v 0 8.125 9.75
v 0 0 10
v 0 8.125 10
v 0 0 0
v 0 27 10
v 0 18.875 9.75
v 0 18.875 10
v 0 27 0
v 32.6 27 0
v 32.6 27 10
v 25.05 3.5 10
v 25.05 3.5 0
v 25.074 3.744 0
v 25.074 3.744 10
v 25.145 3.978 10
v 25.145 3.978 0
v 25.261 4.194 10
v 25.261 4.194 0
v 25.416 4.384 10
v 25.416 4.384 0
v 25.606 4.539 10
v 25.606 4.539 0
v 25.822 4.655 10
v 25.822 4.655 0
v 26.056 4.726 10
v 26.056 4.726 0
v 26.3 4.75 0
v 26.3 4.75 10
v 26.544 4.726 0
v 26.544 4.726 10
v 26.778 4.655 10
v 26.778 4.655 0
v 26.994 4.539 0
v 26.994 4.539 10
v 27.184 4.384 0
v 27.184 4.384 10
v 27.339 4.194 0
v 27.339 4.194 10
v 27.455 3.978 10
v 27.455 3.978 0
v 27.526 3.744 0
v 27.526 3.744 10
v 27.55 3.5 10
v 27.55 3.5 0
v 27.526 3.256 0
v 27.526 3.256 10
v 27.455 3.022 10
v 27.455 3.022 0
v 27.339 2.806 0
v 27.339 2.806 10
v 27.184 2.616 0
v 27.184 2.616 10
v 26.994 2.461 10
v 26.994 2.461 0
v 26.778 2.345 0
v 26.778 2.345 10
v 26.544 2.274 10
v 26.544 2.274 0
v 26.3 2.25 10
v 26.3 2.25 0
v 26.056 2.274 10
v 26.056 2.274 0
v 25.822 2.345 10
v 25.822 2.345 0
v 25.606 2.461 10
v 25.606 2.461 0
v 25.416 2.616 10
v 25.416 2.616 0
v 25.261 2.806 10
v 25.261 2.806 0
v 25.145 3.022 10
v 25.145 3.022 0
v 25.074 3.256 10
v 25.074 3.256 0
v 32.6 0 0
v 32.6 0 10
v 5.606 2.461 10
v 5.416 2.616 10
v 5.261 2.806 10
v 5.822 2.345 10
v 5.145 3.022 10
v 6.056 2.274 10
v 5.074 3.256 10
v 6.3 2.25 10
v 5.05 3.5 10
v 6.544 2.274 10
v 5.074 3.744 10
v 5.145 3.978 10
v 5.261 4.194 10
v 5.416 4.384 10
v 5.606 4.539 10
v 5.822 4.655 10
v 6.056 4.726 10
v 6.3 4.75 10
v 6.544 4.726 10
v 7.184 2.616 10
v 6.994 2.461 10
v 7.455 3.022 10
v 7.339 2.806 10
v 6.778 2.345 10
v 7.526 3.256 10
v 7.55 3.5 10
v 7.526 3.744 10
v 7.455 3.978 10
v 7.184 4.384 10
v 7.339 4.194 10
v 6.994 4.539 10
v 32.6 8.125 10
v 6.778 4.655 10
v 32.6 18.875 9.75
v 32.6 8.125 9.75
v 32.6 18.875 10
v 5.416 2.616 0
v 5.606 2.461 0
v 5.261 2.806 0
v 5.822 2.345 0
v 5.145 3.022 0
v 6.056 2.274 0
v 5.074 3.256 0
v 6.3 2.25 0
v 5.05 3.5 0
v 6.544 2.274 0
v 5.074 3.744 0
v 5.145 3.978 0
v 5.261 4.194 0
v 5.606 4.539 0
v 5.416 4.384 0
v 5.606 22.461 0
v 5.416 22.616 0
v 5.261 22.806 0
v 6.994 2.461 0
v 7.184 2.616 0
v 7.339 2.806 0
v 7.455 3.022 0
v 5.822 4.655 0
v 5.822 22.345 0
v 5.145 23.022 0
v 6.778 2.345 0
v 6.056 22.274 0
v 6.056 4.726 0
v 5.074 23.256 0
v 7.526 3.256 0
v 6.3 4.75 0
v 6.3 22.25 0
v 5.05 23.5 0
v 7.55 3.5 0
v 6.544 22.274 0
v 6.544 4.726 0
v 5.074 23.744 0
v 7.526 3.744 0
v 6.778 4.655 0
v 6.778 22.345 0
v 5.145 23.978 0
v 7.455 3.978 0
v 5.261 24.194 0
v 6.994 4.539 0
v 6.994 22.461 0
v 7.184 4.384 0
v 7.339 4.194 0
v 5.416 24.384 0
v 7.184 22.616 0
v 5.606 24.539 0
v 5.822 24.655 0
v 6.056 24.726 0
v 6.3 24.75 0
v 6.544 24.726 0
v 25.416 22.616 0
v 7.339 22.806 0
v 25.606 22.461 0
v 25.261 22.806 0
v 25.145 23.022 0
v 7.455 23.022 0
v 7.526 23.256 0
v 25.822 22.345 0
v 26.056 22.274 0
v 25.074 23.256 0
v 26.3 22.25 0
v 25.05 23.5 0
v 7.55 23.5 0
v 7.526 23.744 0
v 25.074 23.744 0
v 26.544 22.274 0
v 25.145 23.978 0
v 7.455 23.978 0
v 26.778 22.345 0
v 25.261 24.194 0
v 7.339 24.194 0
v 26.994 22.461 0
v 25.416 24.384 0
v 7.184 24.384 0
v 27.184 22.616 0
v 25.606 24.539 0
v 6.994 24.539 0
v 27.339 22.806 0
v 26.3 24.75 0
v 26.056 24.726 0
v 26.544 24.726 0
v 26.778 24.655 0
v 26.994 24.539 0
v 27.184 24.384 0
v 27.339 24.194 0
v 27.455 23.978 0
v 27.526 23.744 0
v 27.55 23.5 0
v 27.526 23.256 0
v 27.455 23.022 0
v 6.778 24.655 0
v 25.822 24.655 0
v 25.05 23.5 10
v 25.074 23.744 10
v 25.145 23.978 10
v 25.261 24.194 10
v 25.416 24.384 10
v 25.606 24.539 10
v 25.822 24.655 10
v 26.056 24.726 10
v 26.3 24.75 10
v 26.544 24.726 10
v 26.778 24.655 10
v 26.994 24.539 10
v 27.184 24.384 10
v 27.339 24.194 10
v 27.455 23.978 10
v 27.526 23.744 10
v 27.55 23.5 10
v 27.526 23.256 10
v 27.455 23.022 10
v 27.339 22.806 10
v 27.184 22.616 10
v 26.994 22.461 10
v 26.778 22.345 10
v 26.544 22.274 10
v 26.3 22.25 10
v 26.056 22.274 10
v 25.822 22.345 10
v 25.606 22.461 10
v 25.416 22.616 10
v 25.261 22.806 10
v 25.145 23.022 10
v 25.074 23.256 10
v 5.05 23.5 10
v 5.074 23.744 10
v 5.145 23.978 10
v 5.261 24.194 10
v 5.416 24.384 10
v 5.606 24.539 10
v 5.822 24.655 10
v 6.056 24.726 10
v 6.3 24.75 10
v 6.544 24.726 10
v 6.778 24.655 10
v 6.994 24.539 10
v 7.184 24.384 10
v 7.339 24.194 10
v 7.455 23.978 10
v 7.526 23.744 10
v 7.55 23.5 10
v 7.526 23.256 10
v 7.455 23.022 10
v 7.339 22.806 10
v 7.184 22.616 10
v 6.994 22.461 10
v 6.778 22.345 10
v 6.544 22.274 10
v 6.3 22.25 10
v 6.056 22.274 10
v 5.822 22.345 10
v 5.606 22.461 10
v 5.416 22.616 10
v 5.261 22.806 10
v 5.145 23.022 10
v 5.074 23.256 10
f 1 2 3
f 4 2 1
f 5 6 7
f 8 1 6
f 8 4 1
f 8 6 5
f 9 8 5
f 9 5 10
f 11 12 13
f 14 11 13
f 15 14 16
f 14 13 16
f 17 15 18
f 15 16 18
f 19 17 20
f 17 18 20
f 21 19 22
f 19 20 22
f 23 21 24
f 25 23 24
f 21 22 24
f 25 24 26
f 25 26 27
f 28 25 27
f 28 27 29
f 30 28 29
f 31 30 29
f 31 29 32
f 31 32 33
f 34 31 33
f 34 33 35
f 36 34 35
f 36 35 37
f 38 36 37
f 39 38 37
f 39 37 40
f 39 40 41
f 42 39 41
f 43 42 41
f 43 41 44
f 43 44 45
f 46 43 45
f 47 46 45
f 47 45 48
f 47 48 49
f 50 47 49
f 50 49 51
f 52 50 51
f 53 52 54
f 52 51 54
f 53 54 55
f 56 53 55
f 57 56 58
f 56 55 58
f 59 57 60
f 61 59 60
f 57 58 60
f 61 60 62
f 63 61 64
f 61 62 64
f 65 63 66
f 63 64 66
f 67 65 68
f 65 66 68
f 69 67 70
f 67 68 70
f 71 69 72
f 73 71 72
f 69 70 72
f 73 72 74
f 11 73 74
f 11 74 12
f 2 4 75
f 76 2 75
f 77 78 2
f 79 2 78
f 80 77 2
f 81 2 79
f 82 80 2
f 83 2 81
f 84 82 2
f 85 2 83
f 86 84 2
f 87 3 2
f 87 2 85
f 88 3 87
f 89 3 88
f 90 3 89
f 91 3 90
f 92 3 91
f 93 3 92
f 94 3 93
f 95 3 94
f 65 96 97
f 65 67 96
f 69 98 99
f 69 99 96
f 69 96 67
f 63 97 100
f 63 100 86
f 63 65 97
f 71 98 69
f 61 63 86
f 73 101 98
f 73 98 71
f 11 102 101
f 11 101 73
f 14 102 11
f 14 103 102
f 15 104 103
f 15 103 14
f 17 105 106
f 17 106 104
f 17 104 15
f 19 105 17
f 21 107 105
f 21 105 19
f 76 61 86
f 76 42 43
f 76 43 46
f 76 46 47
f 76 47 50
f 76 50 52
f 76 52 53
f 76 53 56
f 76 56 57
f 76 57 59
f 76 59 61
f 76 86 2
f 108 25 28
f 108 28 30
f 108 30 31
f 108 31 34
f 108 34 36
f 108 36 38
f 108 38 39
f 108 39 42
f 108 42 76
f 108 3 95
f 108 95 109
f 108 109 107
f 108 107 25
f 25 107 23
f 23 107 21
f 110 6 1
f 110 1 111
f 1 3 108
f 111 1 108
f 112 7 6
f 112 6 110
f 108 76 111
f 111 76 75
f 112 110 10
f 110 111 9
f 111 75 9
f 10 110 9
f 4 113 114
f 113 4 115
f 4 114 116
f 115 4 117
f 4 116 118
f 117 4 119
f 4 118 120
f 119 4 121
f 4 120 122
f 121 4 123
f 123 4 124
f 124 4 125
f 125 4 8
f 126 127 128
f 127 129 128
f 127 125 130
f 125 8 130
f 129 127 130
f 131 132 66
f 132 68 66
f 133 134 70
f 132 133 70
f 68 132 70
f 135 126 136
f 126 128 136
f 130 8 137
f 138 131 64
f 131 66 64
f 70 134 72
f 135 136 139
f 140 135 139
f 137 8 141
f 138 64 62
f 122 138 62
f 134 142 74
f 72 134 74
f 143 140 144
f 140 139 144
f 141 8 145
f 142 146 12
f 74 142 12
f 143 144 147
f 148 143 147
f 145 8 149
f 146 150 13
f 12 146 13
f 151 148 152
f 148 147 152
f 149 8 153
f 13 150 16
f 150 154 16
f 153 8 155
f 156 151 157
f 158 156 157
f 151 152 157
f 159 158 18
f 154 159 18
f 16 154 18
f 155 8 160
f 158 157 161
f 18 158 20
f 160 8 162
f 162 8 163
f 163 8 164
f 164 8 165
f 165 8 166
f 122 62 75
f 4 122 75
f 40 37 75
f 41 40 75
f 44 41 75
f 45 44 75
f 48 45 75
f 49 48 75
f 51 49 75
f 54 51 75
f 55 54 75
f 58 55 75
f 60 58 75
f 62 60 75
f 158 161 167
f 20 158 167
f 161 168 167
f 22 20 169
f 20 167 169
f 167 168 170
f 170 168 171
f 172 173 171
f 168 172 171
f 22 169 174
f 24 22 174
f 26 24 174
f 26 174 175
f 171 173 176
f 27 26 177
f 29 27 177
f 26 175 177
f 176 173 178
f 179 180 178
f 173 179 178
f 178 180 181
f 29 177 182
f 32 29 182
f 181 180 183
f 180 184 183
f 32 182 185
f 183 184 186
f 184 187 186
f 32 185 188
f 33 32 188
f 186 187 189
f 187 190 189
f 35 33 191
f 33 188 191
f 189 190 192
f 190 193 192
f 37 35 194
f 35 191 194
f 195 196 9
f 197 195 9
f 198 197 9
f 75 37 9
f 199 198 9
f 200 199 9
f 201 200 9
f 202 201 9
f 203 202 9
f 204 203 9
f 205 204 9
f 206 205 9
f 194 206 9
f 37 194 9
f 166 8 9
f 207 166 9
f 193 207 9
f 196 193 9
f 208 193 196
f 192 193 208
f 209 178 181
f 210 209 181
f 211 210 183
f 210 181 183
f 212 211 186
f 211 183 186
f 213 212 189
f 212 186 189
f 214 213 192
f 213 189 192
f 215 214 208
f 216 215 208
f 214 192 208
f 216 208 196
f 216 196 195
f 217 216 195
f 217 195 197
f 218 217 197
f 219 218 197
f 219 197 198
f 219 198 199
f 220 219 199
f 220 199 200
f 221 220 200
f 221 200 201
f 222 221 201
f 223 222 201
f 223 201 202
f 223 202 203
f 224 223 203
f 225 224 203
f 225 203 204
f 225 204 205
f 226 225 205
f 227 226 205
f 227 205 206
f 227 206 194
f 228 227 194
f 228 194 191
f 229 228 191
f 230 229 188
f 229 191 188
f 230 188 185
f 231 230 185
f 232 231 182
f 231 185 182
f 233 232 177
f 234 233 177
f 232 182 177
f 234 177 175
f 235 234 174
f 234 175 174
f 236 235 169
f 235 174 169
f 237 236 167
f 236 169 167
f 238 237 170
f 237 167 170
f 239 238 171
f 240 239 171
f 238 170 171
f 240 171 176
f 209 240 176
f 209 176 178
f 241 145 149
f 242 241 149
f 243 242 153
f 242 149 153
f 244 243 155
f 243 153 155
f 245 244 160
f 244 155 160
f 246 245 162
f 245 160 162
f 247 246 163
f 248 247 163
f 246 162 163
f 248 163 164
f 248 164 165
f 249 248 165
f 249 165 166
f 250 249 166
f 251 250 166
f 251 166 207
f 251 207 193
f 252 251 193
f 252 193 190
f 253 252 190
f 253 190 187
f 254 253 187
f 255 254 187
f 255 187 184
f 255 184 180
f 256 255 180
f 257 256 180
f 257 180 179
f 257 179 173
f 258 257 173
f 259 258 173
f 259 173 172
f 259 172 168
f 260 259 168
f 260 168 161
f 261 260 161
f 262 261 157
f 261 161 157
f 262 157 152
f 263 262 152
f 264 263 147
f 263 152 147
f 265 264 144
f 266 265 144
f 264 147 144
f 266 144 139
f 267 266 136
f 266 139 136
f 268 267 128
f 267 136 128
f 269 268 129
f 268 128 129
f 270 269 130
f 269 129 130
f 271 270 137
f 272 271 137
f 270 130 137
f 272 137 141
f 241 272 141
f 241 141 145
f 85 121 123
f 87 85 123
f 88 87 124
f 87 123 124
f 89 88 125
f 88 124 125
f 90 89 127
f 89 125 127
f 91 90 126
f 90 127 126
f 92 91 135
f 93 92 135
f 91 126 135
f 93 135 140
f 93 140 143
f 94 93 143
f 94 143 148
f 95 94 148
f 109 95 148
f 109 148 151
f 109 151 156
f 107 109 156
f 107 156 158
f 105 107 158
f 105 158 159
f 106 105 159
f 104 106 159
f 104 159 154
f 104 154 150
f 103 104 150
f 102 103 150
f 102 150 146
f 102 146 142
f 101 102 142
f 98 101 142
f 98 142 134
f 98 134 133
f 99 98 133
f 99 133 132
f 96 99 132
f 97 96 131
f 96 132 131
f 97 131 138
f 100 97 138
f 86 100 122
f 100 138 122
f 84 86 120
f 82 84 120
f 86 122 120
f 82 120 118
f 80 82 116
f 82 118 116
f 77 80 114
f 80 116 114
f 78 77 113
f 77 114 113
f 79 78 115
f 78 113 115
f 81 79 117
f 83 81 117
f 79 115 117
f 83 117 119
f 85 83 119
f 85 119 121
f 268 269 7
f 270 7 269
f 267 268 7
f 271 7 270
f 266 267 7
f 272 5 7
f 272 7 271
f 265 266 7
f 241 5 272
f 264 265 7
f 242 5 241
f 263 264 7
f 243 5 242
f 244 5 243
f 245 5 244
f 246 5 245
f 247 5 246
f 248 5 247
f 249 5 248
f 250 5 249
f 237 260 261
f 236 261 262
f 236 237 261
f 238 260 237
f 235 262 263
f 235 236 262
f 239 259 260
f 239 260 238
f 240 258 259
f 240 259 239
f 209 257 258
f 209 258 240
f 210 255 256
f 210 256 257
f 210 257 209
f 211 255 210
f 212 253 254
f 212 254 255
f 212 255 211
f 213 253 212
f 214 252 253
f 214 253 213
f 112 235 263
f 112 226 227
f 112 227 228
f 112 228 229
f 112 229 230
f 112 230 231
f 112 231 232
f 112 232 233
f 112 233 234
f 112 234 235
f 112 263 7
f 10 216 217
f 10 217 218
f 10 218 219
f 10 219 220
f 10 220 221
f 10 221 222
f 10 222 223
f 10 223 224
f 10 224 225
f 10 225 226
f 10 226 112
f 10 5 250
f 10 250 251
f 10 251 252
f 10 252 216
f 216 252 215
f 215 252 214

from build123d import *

# Parameters (mm, degrees)
F0_W     = 32.6
F0_H     = 27
F1_DEPTH = 10
F2_W     = 32.6
F2_H     = 10.75
F3_DEPTH = 0.25
F5_D     = 2.5
F5_DEPTH = 14.2
F5_TIP   = 0.7510757738


with BuildPart() as f1:
    # F0 (on Top) → F1 (new body)
    with BuildSketch(Plane.XY):
        with Locations((16.3, 13.5)):
            Rectangle(F0_W, F0_H)
    extrude(amount=F1_DEPTH)

    # F2 (on face) → F3 (cut)
    with BuildSketch(Plane.XY.offset(10)):
        with Locations((16.3, 13.5)):
            Rectangle(F2_W, F2_H)
    extrude(amount=-F3_DEPTH, mode=Mode.SUBTRACT)

    # F5
    with Locations(Plane.XY.offset(10)):
        with Locations((6.3, 23.5), (26.3, 23.5), (26.3, 3.5), (6.3, 3.5)):
            Hole(F5_D / 2, depth=F5_DEPTH)
            with Locations((0, 0, -(F5_DEPTH + F5_TIP / 2))):  # 118° drill point
                Cone(0, F5_D / 2, F5_TIP, mode=Mode.SUBTRACT)


solid = f1.part
